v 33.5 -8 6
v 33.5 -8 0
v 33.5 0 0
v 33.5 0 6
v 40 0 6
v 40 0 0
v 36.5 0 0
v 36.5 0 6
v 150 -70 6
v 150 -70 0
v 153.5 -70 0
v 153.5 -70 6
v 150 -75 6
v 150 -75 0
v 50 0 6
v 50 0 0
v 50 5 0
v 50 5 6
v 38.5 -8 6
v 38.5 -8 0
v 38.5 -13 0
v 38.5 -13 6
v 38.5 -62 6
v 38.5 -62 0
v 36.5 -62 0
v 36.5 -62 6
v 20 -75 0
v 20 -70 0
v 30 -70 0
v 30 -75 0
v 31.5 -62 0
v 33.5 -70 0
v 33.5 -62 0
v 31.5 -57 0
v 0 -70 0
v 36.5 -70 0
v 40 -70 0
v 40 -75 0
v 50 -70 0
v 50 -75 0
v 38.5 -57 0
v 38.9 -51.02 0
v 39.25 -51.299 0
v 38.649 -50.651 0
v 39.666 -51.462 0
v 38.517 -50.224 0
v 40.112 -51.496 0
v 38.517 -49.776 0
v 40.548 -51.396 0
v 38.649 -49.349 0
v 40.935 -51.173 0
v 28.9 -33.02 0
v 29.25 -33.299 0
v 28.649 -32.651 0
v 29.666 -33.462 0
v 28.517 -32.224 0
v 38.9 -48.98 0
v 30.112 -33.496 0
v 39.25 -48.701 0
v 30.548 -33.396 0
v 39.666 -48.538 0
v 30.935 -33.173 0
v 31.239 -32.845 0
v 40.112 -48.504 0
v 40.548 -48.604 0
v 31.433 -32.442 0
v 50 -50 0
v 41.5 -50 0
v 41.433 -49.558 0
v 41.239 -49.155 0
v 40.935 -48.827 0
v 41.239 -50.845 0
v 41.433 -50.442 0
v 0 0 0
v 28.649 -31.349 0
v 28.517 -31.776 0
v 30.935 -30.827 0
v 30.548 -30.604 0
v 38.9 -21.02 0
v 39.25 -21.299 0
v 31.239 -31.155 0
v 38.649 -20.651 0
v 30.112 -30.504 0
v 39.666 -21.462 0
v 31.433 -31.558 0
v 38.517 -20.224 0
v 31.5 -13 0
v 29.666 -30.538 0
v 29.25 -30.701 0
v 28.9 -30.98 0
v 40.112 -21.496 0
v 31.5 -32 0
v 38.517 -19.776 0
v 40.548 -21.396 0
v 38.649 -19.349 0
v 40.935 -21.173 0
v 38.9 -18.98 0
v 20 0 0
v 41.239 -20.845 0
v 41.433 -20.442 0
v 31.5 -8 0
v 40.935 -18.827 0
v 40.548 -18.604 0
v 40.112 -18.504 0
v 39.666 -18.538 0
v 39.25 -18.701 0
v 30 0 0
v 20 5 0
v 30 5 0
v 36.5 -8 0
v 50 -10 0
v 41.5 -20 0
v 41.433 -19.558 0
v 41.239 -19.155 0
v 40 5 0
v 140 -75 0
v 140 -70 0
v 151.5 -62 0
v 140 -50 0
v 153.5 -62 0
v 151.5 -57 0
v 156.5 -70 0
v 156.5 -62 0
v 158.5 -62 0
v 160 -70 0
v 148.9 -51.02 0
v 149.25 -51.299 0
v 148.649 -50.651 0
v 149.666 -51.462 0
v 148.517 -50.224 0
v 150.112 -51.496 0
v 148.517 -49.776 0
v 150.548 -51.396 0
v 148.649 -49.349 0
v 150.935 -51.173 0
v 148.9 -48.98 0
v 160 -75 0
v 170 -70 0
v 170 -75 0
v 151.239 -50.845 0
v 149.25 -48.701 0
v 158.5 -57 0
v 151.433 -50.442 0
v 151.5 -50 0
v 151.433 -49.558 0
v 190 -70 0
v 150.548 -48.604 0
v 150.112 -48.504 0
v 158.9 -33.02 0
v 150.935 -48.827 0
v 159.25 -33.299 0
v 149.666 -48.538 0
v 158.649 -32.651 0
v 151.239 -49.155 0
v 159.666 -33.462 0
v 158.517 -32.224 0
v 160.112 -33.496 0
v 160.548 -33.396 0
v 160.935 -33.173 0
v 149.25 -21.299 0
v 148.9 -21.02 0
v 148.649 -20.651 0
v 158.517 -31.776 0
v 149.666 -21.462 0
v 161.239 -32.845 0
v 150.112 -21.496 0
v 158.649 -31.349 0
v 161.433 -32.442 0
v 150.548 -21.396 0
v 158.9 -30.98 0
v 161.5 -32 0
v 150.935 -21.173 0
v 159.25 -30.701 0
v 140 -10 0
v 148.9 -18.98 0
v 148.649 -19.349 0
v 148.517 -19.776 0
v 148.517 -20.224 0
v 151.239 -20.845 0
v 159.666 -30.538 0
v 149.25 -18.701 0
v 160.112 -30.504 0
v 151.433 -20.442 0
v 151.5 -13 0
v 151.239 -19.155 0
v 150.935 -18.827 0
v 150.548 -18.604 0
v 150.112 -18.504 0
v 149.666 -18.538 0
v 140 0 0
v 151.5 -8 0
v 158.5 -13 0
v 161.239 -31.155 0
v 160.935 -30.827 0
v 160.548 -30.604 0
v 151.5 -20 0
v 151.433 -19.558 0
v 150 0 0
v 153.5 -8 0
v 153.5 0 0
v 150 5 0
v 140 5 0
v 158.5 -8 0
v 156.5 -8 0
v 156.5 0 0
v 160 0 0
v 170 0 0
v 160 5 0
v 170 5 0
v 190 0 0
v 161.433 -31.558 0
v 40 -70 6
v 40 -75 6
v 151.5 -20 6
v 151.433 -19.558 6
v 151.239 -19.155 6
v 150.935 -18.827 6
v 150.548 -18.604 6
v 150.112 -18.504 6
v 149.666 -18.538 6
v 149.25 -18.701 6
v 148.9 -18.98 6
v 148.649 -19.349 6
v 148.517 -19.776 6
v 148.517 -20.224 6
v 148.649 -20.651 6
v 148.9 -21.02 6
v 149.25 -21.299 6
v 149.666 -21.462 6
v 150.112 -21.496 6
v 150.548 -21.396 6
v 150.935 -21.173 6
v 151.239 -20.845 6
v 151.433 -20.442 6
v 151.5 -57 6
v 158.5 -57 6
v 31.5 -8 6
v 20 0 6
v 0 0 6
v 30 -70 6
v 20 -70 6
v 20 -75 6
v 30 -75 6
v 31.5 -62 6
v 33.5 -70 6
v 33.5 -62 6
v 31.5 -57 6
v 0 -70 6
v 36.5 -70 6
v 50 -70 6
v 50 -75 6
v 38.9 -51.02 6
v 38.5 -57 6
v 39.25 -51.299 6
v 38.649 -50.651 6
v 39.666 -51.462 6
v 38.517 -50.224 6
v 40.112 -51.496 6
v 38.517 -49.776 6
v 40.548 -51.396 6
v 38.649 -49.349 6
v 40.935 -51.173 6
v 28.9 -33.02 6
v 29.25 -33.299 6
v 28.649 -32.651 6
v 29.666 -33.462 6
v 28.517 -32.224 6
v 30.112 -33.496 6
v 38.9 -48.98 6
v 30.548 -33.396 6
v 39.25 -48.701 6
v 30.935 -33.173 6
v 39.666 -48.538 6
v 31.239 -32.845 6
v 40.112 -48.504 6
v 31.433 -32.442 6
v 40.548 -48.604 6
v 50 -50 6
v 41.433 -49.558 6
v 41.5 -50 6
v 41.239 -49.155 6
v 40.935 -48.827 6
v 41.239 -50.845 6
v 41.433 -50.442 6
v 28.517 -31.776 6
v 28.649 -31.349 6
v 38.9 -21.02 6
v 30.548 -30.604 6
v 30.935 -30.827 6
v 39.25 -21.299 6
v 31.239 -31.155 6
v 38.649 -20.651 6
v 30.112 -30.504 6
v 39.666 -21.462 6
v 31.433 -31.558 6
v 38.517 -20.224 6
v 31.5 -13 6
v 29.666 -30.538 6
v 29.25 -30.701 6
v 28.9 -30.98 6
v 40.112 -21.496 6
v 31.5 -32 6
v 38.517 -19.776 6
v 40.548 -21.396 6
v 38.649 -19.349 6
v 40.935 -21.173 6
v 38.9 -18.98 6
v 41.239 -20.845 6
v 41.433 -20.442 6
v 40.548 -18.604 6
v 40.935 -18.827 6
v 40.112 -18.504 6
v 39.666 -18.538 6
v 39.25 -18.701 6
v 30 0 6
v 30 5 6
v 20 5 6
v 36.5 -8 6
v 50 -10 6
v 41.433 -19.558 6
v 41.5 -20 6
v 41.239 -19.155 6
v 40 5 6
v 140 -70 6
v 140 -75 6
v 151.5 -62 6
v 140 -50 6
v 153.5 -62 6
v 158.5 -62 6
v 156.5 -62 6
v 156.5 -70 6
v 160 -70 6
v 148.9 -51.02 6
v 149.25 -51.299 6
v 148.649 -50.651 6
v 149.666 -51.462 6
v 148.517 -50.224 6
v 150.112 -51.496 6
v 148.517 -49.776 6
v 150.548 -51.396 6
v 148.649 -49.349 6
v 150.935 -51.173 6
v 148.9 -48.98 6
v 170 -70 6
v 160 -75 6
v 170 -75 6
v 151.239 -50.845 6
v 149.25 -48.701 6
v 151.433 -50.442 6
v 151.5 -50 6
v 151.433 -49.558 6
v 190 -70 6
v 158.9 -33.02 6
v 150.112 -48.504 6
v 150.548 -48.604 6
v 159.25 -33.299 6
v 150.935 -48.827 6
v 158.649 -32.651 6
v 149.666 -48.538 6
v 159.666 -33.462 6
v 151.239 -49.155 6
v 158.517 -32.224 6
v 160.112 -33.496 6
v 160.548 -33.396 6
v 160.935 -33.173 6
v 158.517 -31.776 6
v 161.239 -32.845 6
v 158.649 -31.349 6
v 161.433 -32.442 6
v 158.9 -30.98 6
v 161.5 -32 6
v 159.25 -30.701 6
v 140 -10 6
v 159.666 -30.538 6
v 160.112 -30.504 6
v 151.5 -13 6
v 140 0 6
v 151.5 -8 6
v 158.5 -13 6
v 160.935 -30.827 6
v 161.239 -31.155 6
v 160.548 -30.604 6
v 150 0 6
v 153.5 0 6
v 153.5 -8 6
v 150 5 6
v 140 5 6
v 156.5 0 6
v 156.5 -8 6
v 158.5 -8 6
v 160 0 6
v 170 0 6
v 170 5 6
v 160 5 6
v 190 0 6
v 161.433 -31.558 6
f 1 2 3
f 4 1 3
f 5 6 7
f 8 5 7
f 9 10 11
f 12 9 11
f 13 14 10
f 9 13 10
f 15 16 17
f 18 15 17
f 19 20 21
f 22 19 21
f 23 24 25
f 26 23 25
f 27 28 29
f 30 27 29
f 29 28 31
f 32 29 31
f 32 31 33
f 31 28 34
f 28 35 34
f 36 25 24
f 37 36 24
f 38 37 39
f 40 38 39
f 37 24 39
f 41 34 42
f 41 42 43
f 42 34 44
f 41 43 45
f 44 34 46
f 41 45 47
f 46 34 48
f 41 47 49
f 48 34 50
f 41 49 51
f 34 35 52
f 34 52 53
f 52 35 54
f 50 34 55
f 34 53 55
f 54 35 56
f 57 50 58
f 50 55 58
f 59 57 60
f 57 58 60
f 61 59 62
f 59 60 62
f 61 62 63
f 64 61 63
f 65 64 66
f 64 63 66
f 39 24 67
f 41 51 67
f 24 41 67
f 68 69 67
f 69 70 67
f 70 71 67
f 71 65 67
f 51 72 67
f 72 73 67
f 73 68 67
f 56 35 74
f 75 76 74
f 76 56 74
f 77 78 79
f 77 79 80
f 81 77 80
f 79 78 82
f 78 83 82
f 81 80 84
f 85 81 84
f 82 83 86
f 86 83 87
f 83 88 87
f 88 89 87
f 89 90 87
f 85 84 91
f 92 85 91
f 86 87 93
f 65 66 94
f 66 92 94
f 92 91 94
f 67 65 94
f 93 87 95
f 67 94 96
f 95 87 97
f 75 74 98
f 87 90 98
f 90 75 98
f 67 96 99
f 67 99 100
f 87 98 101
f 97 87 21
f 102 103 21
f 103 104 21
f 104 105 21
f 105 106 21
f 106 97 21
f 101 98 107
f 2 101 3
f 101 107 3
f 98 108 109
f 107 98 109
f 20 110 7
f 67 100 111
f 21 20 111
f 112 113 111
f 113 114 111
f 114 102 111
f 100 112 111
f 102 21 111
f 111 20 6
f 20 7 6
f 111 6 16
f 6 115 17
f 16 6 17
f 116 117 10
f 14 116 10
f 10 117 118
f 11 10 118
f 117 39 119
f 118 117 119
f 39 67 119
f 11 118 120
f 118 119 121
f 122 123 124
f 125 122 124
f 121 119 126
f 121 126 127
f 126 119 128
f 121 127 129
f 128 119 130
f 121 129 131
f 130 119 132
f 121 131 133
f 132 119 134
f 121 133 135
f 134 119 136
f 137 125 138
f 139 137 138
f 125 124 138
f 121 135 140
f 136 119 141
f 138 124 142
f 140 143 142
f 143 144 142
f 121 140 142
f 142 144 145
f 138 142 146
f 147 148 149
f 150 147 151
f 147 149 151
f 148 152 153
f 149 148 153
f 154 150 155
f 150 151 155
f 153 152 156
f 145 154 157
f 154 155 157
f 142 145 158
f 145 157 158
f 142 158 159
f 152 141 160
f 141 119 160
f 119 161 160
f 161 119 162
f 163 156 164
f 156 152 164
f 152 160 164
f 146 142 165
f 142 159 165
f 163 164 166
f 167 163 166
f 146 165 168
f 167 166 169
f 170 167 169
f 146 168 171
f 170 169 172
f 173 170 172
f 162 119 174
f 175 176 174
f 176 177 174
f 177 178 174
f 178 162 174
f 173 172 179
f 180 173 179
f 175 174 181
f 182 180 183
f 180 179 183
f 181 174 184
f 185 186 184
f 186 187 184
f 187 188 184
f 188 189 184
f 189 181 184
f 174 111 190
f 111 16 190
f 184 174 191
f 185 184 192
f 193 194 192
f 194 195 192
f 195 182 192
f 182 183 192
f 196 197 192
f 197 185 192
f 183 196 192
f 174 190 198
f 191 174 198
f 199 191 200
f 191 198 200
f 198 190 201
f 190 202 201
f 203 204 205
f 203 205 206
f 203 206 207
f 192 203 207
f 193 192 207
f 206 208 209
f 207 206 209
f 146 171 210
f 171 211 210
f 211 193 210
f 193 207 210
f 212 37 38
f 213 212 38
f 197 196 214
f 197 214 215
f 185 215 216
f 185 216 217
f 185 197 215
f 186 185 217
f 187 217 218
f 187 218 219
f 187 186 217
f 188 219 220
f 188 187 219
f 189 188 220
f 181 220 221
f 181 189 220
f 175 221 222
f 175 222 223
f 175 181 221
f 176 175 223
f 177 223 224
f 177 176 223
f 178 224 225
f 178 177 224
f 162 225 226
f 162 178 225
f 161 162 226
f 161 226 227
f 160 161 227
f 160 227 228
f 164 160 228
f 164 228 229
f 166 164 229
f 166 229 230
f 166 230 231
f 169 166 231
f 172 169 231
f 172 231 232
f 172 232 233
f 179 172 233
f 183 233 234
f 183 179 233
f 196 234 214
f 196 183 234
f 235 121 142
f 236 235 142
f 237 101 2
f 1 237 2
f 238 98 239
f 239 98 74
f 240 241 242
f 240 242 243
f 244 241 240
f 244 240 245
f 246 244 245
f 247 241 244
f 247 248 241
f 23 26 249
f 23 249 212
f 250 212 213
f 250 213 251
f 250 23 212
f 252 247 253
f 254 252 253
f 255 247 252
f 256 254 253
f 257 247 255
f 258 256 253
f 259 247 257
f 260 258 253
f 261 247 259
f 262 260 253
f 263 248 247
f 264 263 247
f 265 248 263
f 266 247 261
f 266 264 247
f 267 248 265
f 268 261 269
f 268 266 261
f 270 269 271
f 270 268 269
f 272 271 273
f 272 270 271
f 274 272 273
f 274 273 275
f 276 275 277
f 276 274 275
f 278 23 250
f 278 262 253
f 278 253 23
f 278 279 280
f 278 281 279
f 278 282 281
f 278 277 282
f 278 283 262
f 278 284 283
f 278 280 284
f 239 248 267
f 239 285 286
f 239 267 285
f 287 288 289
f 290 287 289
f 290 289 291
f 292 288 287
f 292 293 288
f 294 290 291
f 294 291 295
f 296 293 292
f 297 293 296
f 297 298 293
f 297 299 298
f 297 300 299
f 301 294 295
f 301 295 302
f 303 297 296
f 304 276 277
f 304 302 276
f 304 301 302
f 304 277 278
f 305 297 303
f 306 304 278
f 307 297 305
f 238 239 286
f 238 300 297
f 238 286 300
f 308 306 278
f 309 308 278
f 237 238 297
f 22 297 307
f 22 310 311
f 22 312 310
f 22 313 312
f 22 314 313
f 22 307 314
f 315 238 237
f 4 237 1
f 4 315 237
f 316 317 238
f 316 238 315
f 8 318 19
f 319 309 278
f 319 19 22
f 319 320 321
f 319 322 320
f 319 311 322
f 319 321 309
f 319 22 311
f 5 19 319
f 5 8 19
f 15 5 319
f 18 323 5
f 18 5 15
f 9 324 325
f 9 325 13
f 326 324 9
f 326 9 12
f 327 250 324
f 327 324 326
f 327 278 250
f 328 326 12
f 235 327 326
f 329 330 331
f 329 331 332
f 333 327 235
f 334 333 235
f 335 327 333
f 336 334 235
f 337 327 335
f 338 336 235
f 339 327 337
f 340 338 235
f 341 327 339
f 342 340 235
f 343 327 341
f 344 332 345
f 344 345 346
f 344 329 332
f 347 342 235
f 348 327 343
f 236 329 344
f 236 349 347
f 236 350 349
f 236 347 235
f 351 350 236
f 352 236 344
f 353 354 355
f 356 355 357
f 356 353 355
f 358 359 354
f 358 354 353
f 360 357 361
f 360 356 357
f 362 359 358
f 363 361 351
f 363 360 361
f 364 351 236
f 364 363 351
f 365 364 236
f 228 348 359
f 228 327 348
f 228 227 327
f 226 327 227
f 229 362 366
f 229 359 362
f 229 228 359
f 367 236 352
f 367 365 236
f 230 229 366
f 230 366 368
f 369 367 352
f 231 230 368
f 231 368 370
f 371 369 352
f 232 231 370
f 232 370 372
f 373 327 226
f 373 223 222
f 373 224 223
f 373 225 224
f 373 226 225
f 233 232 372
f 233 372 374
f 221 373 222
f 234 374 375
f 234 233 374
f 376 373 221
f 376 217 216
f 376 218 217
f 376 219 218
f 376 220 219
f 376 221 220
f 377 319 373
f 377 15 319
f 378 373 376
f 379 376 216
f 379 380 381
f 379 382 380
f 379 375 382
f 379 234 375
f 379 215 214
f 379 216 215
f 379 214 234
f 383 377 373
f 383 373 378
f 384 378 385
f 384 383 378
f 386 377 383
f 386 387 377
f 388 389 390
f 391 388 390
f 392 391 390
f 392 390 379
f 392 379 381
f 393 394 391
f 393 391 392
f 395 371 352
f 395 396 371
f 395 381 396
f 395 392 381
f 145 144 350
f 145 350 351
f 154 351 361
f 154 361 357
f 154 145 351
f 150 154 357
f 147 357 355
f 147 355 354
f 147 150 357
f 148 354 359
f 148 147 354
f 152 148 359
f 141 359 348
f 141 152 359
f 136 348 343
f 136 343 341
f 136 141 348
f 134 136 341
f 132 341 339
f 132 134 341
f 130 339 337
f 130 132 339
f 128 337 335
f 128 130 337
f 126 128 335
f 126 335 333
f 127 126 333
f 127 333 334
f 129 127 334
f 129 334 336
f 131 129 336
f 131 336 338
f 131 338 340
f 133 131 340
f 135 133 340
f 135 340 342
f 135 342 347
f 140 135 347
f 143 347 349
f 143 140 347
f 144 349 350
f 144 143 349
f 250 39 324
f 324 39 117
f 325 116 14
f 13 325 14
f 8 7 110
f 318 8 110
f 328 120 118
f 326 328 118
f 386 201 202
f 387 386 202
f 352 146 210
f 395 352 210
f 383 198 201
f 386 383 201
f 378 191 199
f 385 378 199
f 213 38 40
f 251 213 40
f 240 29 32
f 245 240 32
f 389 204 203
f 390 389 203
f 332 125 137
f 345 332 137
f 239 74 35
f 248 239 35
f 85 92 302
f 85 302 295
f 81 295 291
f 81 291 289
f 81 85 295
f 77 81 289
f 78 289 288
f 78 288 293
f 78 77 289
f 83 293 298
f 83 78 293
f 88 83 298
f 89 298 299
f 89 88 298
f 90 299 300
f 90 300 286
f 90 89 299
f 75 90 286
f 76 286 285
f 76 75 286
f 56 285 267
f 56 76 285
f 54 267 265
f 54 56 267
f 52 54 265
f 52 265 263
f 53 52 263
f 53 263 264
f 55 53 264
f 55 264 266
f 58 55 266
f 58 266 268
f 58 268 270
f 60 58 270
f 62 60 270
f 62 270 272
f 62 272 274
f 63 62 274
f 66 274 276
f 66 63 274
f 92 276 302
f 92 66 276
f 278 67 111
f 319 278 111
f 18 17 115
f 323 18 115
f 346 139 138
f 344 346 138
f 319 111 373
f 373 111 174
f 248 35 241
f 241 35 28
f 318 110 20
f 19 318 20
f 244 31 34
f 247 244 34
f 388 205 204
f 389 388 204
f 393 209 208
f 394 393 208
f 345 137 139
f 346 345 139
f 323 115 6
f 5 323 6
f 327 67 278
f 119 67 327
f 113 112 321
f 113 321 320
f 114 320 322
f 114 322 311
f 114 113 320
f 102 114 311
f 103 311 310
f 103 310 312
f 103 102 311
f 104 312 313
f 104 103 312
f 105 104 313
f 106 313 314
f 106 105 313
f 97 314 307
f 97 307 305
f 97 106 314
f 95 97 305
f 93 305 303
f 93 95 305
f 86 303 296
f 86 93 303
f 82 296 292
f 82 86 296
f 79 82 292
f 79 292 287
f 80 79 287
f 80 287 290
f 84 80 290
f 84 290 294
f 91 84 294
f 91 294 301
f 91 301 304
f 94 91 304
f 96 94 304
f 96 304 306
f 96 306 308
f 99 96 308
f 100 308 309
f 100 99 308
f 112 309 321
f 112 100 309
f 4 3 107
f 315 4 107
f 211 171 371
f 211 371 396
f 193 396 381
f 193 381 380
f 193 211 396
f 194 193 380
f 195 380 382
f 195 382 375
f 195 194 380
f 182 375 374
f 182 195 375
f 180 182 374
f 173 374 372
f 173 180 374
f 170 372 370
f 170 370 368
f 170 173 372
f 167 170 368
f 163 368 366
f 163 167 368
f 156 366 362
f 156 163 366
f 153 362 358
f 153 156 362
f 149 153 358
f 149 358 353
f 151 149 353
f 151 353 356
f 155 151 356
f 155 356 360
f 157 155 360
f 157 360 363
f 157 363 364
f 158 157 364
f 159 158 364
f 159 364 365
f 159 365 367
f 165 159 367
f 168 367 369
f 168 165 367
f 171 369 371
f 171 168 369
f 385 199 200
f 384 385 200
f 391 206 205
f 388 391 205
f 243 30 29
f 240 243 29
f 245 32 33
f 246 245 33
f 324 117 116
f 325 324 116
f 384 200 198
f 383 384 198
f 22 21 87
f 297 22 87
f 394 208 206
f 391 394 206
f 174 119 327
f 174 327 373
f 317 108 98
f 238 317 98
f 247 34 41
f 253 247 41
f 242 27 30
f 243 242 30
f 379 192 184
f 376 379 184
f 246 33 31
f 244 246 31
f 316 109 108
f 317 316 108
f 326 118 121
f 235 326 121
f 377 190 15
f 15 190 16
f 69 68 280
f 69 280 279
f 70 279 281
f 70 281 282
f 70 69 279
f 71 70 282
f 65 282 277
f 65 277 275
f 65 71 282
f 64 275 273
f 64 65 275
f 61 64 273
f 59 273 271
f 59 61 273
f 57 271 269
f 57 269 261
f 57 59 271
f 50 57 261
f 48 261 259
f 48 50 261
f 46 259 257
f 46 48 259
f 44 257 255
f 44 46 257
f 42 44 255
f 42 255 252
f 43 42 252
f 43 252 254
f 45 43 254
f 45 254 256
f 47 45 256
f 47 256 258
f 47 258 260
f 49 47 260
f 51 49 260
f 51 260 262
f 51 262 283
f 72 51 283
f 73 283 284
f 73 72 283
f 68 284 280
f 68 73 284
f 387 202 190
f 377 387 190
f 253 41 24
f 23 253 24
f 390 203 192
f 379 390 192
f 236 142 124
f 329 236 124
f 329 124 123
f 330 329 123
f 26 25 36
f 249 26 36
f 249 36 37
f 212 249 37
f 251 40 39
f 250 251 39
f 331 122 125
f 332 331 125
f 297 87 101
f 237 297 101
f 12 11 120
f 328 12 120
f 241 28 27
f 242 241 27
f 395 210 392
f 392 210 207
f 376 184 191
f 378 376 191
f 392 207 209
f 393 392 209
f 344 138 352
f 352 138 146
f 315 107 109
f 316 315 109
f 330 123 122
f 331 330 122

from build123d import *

# Parameters (mm, degrees)
MODEL_R                  = 1.5
MODEL_W                  = 90
MODEL_H                  = 40
RESSALTO_EXTRUS_O1_DEPTH = 6


with BuildPart() as part:
    # Model → Ressalto-extrusão1 (new body)
    with BuildSketch(Plane.XY):
        Polygon((36.5, -62), (36.5, -70), (40, -70), (40, -75), (50, -75), (50, -70), (140, -70), (140, -75), (150, -75), (150, -70), (153.5, -70), (153.5, -62), (151.5, -62), (151.5, -57), (158.5, -57), (158.5, -62), (156.5, -62), (156.5, -70), (160, -70), (160, -75), (170, -75), (170, -70), (190, -70), (190, 0), (170, 0), (170, 5), (160, 5), (160, 0), (156.5, 0), (156.5, -8), (158.5, -8), (158.5, -13), (151.5, -13), (151.5, -8), (153.5, -8), (153.5, 0), (150, 0), (150, 5), (140, 5), (140, 0), (50, 0), (50, 5), (40, 5), (40, 0), (36.5, 0), (36.5, -8), (38.5, -8), (38.5, -13), (31.5, -13), (31.5, -8), (33.5, -8), (33.5, 0), (30, 0), (30, 5), (20, 5), (20, 0), (0, 0), (0, -70), (20, -70), (20, -75), (30, -75), (30, -70), (33.5, -70), (33.5, -62), (31.5, -62), (31.5, -57), (38.5, -57), (38.5, -62), align=None)
        with Locations((30, -32)):
            Circle(MODEL_R, mode=Mode.SUBTRACT)
        with Locations((150, -50)):
            Circle(MODEL_R, mode=Mode.SUBTRACT)
        with Locations((40, -20)):
            Circle(MODEL_R, mode=Mode.SUBTRACT)
        with Locations((150, -20)):
            Circle(MODEL_R, mode=Mode.SUBTRACT)
        with Locations((40, -50)):
            Circle(MODEL_R, mode=Mode.SUBTRACT)
        with Locations((160, -32)):
            Circle(MODEL_R, mode=Mode.SUBTRACT)
        with Locations((95, -30)):
            Rectangle(MODEL_W, MODEL_H, mode=Mode.SUBTRACT)
    extrude(amount=RESSALTO_EXTRUS_O1_DEPTH)


solid = part.part
